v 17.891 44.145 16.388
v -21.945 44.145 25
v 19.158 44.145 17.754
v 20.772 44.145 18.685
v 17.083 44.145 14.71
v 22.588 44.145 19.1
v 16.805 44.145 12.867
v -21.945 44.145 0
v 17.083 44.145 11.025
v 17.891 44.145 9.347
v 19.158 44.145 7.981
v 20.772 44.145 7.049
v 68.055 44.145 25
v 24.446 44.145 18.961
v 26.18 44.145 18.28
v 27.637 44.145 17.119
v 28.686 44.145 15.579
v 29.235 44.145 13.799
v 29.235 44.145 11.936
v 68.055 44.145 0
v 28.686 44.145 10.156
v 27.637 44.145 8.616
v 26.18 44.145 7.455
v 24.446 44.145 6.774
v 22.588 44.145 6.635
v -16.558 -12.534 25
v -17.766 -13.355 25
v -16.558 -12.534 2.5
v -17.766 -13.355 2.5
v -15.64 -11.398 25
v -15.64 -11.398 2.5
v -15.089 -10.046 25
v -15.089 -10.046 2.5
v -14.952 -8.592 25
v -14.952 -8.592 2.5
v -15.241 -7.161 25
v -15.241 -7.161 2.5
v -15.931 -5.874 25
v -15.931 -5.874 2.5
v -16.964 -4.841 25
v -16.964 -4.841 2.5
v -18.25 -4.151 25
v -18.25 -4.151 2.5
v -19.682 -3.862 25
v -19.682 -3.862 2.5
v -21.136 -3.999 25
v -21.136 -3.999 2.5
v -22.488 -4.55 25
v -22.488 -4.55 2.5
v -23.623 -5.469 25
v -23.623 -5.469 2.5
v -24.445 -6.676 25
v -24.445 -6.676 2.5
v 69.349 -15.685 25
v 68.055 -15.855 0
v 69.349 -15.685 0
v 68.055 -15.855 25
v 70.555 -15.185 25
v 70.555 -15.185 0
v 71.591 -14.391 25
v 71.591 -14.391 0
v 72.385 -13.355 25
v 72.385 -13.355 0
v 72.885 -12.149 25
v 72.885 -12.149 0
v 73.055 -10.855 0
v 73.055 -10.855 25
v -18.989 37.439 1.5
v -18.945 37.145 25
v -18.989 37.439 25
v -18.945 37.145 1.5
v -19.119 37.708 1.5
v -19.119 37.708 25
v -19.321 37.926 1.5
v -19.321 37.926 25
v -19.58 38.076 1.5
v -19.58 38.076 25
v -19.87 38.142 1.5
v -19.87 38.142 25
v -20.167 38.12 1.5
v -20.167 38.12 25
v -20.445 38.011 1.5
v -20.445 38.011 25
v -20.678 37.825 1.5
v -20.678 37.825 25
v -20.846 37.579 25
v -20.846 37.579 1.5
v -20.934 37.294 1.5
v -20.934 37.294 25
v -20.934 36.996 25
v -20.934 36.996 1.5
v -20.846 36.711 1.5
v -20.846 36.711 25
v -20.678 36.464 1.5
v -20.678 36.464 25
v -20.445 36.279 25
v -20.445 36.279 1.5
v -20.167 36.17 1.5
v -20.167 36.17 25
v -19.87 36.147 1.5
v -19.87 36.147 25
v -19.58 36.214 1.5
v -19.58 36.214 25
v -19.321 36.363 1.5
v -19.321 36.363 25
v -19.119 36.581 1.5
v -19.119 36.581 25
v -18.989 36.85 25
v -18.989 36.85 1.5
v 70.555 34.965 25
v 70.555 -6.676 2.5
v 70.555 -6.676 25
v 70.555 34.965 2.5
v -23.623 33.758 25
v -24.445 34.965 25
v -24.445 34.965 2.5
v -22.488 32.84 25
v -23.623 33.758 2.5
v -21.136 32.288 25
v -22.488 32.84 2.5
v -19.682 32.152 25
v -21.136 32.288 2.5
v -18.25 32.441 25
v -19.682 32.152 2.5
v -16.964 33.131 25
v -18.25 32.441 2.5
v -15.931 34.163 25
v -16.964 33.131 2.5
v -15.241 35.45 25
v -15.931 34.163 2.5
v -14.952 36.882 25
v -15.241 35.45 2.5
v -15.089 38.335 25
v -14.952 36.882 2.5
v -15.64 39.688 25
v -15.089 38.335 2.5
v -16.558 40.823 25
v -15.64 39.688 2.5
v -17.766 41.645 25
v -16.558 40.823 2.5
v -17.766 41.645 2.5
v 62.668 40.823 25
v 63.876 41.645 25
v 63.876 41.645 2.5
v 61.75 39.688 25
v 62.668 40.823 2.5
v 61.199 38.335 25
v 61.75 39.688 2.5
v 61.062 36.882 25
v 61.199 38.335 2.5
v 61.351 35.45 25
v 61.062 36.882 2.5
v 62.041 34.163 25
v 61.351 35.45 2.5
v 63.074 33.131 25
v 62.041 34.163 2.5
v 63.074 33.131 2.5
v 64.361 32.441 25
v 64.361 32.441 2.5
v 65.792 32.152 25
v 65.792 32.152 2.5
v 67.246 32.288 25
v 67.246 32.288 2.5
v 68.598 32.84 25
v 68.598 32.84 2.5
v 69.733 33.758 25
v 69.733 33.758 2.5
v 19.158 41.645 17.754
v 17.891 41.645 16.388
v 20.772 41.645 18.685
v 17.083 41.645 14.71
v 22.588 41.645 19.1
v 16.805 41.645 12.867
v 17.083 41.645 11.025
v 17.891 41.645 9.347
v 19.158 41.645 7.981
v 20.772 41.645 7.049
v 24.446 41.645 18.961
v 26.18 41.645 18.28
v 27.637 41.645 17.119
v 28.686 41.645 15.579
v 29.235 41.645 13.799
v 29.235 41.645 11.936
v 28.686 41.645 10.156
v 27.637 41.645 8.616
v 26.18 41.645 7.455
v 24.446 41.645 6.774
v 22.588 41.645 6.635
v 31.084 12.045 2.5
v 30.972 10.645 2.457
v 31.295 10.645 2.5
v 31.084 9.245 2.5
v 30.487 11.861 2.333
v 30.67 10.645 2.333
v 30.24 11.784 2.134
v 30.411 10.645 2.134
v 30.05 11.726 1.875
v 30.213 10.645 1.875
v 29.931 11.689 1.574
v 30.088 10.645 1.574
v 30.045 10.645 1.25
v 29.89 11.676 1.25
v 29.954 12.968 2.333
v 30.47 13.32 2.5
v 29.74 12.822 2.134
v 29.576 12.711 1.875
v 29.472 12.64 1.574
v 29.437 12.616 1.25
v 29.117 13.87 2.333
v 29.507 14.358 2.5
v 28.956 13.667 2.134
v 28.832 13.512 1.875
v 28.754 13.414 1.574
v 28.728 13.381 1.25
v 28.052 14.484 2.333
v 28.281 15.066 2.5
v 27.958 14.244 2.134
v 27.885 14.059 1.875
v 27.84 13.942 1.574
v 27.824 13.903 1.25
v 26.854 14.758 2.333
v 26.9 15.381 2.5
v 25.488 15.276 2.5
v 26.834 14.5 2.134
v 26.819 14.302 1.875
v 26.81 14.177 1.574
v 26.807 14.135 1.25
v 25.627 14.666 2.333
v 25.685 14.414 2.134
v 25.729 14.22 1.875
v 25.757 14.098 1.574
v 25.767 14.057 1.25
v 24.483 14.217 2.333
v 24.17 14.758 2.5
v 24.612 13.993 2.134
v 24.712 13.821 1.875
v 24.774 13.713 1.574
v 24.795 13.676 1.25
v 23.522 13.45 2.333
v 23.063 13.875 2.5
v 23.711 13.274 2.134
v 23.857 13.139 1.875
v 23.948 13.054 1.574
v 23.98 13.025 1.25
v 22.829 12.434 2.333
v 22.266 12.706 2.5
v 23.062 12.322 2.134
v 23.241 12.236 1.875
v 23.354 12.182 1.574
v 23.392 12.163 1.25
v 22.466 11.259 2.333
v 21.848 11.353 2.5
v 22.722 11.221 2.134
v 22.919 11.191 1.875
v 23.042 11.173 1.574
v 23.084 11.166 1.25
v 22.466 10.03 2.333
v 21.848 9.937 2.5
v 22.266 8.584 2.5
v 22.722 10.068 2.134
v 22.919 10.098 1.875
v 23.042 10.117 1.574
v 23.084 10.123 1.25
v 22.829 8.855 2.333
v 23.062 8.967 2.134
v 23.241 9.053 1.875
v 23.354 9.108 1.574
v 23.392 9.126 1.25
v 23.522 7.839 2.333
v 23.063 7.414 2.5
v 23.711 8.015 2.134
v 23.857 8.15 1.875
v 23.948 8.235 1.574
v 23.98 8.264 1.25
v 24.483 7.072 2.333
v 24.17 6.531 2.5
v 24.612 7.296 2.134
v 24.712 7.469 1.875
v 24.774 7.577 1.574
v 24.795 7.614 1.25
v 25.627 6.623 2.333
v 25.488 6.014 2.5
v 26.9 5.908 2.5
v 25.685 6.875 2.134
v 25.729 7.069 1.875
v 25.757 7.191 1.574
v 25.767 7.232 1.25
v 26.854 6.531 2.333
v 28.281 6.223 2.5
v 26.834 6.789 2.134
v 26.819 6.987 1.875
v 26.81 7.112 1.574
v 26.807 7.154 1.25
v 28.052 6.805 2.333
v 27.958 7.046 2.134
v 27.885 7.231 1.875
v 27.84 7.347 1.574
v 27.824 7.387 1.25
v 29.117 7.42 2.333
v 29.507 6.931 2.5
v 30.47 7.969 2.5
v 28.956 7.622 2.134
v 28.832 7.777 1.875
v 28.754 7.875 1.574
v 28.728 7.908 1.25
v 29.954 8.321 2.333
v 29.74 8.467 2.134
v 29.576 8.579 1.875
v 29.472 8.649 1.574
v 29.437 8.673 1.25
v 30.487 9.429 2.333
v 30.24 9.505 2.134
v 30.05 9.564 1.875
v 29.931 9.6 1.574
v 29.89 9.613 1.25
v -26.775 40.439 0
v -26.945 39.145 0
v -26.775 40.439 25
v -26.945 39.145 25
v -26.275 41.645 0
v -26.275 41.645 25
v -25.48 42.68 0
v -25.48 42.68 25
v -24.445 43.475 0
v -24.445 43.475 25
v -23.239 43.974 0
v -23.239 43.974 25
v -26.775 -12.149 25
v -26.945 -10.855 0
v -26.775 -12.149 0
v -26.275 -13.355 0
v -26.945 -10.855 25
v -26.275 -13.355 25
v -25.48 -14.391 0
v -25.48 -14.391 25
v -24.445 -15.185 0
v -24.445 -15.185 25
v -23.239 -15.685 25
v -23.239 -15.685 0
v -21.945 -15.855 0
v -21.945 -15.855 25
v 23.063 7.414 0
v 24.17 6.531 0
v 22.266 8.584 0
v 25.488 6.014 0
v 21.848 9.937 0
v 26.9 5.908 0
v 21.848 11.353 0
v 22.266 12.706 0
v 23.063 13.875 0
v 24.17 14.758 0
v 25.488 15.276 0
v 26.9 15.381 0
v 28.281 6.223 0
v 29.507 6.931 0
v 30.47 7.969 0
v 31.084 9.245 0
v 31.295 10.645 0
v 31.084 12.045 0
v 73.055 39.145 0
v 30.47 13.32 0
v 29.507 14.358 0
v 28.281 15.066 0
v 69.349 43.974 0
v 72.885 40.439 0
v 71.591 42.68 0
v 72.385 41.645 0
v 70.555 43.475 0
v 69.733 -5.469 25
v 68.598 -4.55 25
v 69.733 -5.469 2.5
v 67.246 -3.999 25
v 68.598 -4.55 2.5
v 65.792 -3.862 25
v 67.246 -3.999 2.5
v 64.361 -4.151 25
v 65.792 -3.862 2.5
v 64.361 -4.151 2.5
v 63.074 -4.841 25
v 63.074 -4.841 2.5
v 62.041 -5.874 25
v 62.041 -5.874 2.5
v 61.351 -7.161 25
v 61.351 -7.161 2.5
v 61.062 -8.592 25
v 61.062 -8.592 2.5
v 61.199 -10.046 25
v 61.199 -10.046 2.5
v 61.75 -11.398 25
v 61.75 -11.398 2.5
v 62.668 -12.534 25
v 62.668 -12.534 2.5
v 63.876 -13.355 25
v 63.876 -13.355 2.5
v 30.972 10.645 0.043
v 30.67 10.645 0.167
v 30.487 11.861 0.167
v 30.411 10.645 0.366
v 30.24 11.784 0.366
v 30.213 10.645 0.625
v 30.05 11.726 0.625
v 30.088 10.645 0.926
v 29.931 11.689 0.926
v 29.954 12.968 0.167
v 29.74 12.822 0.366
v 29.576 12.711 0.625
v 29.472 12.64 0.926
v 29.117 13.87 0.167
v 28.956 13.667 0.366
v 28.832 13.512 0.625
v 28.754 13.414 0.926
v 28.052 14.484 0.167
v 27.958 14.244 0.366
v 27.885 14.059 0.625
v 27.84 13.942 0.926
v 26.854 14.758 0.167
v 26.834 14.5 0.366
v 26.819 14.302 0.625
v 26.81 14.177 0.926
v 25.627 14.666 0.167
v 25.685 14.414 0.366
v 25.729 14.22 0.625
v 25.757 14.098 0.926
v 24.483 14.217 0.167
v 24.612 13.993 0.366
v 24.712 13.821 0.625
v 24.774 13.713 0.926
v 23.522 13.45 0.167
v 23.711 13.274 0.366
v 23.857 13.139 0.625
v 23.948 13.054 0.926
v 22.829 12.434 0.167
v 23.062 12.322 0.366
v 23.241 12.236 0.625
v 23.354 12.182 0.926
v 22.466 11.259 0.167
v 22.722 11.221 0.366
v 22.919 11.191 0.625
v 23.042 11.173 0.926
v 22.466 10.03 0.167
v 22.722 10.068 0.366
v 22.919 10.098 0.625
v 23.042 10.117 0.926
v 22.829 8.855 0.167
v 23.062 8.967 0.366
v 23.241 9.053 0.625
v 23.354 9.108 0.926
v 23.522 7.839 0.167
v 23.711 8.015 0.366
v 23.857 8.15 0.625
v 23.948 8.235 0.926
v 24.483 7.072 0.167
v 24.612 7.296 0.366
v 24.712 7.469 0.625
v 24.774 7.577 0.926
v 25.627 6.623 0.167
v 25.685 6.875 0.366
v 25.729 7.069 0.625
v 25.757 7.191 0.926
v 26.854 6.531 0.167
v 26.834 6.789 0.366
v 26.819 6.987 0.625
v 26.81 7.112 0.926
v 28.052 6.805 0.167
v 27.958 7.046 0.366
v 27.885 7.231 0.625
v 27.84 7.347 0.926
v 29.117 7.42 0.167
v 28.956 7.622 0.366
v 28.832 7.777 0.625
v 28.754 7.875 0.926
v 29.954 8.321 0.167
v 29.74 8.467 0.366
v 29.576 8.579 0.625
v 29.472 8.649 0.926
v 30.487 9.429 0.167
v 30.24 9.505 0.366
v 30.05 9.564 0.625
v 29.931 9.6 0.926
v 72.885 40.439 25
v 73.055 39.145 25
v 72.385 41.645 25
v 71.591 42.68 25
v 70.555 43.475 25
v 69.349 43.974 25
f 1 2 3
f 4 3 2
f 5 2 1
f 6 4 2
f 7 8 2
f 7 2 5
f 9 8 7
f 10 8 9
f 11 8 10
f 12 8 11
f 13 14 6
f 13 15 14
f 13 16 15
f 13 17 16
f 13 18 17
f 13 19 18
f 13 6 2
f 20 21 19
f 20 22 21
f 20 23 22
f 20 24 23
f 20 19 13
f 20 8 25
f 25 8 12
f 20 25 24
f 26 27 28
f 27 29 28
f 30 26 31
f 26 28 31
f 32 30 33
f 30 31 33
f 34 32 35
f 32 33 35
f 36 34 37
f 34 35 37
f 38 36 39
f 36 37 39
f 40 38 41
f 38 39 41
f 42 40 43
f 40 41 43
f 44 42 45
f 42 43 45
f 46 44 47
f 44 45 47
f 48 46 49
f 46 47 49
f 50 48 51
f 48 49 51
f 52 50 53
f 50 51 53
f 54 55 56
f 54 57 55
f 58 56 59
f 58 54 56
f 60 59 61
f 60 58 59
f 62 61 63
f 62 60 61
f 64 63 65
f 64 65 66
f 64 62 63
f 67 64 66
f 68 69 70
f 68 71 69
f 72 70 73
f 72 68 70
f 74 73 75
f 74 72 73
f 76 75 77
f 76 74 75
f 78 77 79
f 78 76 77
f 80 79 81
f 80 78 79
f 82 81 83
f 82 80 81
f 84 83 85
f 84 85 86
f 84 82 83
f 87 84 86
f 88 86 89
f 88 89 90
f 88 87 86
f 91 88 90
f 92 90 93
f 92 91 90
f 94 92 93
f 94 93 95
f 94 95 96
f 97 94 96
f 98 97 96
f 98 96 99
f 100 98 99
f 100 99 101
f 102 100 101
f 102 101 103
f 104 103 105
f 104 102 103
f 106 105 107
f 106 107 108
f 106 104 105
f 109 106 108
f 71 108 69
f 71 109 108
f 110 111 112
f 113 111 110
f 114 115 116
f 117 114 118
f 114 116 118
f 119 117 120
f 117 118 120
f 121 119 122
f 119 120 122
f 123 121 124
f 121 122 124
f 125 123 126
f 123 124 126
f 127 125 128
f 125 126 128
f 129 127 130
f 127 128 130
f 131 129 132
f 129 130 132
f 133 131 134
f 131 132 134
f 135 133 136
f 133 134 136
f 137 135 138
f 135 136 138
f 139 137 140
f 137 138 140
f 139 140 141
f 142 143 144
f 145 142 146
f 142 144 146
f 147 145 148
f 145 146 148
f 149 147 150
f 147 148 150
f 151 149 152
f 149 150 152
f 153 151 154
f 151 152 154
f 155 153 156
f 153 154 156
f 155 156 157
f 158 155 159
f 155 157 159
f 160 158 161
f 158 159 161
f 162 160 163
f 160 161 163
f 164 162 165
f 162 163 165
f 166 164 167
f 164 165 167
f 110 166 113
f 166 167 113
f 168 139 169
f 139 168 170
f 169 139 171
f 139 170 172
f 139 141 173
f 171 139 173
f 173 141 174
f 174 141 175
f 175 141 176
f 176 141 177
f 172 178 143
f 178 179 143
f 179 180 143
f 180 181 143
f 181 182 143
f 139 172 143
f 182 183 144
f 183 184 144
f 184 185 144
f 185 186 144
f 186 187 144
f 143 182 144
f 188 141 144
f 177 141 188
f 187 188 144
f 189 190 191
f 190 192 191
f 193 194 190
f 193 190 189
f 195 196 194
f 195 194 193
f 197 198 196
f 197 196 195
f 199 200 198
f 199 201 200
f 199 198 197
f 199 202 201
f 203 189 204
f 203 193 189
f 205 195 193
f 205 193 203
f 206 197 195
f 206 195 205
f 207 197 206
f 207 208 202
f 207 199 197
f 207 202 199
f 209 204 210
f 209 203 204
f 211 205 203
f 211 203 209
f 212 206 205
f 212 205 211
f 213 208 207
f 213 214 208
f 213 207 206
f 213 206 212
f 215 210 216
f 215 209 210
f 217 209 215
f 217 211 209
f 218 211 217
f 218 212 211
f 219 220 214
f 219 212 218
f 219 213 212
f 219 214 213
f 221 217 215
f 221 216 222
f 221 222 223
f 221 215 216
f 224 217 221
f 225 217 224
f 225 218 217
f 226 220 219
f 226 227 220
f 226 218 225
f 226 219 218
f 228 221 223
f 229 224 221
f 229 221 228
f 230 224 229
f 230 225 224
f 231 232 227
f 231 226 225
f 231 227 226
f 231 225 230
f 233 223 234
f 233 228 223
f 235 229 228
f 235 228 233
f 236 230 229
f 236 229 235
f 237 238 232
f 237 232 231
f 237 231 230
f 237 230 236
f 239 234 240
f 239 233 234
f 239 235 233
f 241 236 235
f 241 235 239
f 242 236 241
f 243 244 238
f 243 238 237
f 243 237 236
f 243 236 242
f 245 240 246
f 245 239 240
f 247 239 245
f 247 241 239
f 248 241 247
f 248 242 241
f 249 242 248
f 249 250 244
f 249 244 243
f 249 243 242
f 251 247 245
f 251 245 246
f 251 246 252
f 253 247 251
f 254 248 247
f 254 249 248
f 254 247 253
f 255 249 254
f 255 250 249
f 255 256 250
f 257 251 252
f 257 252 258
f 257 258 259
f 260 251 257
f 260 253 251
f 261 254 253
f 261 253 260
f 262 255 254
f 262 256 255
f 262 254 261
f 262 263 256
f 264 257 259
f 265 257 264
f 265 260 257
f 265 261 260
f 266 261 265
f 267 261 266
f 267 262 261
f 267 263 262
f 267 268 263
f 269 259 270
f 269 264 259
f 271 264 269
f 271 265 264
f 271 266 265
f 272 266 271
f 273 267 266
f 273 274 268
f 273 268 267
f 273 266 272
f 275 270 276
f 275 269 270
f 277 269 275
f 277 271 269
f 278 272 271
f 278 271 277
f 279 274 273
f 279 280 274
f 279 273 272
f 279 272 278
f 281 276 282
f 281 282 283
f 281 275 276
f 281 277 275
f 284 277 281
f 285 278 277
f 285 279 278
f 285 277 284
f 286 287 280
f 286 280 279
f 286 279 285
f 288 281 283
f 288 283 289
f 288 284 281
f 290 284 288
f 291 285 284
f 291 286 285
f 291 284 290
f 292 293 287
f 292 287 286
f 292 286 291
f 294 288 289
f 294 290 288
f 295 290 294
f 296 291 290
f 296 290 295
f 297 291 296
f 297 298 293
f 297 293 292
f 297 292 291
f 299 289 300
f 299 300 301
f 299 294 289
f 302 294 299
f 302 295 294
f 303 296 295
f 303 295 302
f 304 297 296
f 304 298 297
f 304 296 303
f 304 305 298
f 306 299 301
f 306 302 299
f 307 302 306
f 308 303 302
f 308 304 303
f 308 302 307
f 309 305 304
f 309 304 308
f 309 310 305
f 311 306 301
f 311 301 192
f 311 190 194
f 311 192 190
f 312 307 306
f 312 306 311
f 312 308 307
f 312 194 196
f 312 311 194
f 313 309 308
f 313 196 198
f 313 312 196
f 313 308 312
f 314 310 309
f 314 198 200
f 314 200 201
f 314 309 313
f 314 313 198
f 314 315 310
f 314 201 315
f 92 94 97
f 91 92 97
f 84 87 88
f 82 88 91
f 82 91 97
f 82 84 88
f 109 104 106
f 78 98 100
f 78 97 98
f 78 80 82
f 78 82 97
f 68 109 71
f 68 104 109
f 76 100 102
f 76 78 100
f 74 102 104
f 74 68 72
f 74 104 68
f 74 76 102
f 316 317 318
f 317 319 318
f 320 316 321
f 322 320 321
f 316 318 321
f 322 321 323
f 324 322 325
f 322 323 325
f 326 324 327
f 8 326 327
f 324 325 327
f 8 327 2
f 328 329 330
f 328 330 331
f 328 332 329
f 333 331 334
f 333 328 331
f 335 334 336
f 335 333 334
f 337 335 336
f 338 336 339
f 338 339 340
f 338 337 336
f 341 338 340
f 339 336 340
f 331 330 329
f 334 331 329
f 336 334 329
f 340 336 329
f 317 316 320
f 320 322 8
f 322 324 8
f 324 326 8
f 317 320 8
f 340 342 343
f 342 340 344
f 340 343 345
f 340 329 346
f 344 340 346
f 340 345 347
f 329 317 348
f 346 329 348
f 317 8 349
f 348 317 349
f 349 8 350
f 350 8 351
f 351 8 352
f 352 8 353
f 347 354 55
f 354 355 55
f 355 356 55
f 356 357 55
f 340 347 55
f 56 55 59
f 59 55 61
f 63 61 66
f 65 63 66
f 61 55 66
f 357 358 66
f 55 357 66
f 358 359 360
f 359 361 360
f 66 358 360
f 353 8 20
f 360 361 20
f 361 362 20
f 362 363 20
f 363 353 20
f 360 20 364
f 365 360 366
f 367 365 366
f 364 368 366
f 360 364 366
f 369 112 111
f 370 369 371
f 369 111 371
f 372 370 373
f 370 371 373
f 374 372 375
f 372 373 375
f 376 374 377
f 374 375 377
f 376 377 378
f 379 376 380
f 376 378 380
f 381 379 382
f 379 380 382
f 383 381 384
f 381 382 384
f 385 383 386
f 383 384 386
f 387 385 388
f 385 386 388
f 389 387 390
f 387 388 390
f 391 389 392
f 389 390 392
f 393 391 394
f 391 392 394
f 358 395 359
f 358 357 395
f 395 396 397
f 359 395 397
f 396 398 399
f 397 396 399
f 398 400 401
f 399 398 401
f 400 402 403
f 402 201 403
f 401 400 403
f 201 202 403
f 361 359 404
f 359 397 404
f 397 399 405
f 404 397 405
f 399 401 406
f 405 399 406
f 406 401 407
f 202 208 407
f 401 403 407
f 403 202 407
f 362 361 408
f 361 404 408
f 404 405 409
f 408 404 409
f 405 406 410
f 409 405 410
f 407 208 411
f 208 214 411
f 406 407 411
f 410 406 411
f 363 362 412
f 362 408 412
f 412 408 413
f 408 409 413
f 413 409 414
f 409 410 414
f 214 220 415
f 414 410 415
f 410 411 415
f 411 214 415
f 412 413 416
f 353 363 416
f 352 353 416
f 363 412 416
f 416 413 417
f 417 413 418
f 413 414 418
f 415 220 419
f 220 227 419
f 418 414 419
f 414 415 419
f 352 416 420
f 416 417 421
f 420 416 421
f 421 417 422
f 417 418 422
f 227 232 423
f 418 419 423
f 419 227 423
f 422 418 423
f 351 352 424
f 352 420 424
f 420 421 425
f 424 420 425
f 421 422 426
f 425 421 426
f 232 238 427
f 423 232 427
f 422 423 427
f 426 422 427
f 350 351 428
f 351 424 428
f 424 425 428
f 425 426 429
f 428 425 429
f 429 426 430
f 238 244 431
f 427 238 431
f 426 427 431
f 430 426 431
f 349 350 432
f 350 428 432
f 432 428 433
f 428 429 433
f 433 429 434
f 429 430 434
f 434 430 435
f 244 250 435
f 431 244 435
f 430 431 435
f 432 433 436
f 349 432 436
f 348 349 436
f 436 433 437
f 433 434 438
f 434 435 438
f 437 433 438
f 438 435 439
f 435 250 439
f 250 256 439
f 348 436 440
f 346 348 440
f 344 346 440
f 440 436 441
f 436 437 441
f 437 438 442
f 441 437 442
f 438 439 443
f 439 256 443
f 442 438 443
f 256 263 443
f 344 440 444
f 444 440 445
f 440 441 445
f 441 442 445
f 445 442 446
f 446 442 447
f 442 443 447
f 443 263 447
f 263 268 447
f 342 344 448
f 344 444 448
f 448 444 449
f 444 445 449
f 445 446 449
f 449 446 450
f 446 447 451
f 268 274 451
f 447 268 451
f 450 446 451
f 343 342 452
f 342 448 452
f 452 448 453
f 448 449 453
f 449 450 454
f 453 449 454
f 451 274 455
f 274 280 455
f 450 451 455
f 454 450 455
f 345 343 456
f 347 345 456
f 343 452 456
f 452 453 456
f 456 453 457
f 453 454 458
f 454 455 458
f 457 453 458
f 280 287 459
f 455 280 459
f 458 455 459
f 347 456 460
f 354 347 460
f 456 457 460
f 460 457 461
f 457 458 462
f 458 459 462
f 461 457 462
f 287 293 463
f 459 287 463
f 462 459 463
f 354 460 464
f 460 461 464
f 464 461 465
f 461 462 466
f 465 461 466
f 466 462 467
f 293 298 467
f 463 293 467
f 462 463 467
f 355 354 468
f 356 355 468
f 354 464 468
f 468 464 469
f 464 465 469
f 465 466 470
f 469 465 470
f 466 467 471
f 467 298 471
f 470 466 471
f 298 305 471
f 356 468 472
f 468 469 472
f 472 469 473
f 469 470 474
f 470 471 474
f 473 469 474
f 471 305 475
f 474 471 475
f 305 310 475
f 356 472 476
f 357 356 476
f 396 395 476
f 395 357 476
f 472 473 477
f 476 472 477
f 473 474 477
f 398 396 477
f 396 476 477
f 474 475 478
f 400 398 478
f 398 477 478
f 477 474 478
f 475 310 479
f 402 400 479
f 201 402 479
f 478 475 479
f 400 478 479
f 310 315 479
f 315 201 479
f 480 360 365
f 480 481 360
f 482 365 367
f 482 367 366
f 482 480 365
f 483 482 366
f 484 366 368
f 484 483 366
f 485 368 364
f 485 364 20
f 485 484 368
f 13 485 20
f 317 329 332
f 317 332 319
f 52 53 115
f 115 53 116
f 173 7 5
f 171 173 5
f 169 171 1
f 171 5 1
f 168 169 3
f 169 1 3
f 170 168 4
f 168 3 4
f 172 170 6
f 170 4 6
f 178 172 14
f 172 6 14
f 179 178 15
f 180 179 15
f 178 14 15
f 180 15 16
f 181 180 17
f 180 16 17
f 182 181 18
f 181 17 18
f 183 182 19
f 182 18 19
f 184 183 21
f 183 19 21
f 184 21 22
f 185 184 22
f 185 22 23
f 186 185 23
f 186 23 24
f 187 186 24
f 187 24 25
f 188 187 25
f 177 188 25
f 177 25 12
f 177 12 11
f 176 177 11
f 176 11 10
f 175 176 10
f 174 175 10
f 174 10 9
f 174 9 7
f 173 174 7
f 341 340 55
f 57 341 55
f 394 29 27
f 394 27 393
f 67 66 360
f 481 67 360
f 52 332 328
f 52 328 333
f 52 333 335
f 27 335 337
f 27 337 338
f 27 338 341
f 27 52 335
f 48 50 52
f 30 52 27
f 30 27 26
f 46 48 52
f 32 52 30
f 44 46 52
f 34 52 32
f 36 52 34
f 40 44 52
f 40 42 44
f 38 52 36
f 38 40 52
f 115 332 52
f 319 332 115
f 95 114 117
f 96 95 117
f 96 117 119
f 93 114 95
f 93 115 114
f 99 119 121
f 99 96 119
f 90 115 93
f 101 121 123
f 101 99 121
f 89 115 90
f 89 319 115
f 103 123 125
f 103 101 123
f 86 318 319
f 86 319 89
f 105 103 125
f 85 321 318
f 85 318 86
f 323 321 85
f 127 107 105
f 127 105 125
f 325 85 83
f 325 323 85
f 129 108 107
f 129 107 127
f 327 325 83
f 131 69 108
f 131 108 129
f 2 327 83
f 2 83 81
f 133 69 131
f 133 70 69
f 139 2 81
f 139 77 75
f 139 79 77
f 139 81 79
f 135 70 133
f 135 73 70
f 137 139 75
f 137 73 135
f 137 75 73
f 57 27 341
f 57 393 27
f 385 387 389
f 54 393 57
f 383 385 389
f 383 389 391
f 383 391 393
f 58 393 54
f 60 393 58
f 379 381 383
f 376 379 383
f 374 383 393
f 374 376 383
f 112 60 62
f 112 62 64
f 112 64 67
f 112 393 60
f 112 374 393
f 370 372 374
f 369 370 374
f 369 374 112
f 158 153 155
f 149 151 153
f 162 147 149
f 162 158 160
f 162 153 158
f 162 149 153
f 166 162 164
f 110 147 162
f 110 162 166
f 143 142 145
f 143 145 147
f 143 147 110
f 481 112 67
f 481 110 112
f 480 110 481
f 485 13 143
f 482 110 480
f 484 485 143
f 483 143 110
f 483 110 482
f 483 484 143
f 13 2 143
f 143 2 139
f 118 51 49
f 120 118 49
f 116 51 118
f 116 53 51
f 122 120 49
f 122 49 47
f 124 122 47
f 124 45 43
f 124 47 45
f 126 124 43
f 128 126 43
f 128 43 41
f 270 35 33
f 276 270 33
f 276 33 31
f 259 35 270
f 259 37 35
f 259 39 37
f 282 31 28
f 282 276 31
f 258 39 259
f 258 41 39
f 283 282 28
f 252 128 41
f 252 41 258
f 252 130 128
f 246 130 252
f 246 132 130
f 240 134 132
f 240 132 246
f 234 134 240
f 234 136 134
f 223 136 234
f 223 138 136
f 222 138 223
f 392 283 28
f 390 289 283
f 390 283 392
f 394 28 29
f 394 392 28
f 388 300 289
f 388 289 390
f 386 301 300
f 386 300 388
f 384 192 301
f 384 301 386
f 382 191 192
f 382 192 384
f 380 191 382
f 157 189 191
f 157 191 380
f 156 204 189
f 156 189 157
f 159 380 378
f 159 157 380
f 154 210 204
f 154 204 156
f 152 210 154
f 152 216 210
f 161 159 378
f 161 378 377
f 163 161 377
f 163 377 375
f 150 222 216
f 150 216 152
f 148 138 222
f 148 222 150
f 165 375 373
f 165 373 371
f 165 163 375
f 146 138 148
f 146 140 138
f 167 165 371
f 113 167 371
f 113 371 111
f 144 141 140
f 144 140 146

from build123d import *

# Parameters (mm, degrees)
F0_W           = 100
F0_H           = 60
F1_DEPTH       = 25
F2_T           = -2.5
F3_R           = 5
F4_R           = 5
F5_R           = 3.5
F6_DEPTH       = 25
F7_R           = 1.24999
F8_R           = 5
F8_R_2         = 1
F9_DEPTH       = 25
F10_DEPTH      = 1
F10_DEPTH_BACK = 1
F11_R          = 5
F12_DEPTH      = 25
F13_R          = 5
F14_DEPTH      = 25
F15_R          = 5
F16_DEPTH      = 25
F17_R          = 6.25
F18_DEPTH      = 10


# Not quite as in the source:
# - a fillet or chamfer is up to 0.001 mm smaller than in the source, because OpenCascade refuses the exact size


with BuildPart() as f1:
    # F0 (on Top) → F1 (new body)
    with BuildSketch(Plane.XY):
        with Locations((23.0550479144, 14.1446392238)):
            Rectangle(F0_W, F0_H)
    extrude(amount=F1_DEPTH)

    # F2
    f2_openings = [f1.faces().sort_by_distance(p)[0] for p in [
        (23.055048, 14.144639, 25),
    ]]
    offset(amount=F2_T, openings=f2_openings)

    # F3
    f3_edges = [f1.edges().sort_by_distance(p)[0] for p in [
        (-26.944952, 44.144639, 12.5),
        (-26.944952, -15.855361, 12.5),
        (73.055048, -15.855361, 12.5),
        (73.055048, 44.144639, 12.5),
    ]]
    fillet(f3_edges, radius=F3_R)

    # F4
    f4_edges = [f1.edges().sort_by_distance(p)[0] for p in [
        (70.555048, -13.355361, 13.75),
        (-24.444952, 41.644639, 13.75),
        (-24.444952, -13.355361, 13.75),
        (70.555048, 41.644639, 13.75),
    ]]
    fillet(f4_edges, radius=F4_R)

    # F5 (on face) → F6 (cut)
    with BuildSketch(Plane.XY.offset(2.5)):
        with Locations((26.5453665042, 10.6446392238)):
            Circle(F5_R)
    extrude(amount=-F6_DEPTH, mode=Mode.SUBTRACT)

    # F7 (radius 1.25 in the source; OpenCascade refuses exactly that, so slightly less here)
    f7_edges = [f1.edges().sort_by_distance(p)[0] for p in [
        (23.045367, 10.644639, 0),
        (23.045367, 10.644639, 2.5),
    ]]
    fillet(f7_edges, radius=F7_R)

    # F8 (on face) → F9 (join)
    with BuildSketch(Plane.XY):
        with Locations((-19.9449520856, 37.1446392238)):
            Circle(F8_R)
        with Locations((-19.9449520856, 37.1446392238)):
            Circle(F8_R_2, mode=Mode.SUBTRACT)
    extrude(amount=F9_DEPTH)

    # F10 (cut, two sides): a face of the model
    f10_faces = [f1.faces().sort_by_distance(p)[0] for p in [
        (-19.9449520856, 37.1446392238, 2.5),
    ]]
    extrude(f10_faces, amount=-F10_DEPTH, mode=Mode.SUBTRACT)
    extrude(f10_faces, amount=F10_DEPTH_BACK, mode=Mode.SUBTRACT)

    # F11 (on face) → F12 (join)
    with BuildSketch(Plane.XY):
        with Locations((66.0550479144, 37.1446392238)):
            Circle(F11_R)
    extrude(amount=F12_DEPTH)

    # F13 (on face) → F14 (join)
    with BuildSketch(Plane.XY):
        with Locations((-19.9449520856, -8.8553607762)):
            Circle(F13_R)
    extrude(amount=F14_DEPTH)

    # F15 (on face) → F16 (join)
    with BuildSketch(Plane.XY):
        with Locations((66.0550479144, -8.8553607762)):
            Circle(F15_R)
    extrude(amount=F16_DEPTH)

    # F17 (on face) → F18 (cut)
    with BuildSketch(Plane(origin=(0, 44.1446392238, 0), x_dir=(-1, 0, 0), z_dir=(0, 1, 0))):
        with Locations((-23.0550479144, 12.8674265233)):
            Circle(F17_R)
    extrude(amount=-F18_DEPTH, mode=Mode.SUBTRACT)


solid = f1.part
